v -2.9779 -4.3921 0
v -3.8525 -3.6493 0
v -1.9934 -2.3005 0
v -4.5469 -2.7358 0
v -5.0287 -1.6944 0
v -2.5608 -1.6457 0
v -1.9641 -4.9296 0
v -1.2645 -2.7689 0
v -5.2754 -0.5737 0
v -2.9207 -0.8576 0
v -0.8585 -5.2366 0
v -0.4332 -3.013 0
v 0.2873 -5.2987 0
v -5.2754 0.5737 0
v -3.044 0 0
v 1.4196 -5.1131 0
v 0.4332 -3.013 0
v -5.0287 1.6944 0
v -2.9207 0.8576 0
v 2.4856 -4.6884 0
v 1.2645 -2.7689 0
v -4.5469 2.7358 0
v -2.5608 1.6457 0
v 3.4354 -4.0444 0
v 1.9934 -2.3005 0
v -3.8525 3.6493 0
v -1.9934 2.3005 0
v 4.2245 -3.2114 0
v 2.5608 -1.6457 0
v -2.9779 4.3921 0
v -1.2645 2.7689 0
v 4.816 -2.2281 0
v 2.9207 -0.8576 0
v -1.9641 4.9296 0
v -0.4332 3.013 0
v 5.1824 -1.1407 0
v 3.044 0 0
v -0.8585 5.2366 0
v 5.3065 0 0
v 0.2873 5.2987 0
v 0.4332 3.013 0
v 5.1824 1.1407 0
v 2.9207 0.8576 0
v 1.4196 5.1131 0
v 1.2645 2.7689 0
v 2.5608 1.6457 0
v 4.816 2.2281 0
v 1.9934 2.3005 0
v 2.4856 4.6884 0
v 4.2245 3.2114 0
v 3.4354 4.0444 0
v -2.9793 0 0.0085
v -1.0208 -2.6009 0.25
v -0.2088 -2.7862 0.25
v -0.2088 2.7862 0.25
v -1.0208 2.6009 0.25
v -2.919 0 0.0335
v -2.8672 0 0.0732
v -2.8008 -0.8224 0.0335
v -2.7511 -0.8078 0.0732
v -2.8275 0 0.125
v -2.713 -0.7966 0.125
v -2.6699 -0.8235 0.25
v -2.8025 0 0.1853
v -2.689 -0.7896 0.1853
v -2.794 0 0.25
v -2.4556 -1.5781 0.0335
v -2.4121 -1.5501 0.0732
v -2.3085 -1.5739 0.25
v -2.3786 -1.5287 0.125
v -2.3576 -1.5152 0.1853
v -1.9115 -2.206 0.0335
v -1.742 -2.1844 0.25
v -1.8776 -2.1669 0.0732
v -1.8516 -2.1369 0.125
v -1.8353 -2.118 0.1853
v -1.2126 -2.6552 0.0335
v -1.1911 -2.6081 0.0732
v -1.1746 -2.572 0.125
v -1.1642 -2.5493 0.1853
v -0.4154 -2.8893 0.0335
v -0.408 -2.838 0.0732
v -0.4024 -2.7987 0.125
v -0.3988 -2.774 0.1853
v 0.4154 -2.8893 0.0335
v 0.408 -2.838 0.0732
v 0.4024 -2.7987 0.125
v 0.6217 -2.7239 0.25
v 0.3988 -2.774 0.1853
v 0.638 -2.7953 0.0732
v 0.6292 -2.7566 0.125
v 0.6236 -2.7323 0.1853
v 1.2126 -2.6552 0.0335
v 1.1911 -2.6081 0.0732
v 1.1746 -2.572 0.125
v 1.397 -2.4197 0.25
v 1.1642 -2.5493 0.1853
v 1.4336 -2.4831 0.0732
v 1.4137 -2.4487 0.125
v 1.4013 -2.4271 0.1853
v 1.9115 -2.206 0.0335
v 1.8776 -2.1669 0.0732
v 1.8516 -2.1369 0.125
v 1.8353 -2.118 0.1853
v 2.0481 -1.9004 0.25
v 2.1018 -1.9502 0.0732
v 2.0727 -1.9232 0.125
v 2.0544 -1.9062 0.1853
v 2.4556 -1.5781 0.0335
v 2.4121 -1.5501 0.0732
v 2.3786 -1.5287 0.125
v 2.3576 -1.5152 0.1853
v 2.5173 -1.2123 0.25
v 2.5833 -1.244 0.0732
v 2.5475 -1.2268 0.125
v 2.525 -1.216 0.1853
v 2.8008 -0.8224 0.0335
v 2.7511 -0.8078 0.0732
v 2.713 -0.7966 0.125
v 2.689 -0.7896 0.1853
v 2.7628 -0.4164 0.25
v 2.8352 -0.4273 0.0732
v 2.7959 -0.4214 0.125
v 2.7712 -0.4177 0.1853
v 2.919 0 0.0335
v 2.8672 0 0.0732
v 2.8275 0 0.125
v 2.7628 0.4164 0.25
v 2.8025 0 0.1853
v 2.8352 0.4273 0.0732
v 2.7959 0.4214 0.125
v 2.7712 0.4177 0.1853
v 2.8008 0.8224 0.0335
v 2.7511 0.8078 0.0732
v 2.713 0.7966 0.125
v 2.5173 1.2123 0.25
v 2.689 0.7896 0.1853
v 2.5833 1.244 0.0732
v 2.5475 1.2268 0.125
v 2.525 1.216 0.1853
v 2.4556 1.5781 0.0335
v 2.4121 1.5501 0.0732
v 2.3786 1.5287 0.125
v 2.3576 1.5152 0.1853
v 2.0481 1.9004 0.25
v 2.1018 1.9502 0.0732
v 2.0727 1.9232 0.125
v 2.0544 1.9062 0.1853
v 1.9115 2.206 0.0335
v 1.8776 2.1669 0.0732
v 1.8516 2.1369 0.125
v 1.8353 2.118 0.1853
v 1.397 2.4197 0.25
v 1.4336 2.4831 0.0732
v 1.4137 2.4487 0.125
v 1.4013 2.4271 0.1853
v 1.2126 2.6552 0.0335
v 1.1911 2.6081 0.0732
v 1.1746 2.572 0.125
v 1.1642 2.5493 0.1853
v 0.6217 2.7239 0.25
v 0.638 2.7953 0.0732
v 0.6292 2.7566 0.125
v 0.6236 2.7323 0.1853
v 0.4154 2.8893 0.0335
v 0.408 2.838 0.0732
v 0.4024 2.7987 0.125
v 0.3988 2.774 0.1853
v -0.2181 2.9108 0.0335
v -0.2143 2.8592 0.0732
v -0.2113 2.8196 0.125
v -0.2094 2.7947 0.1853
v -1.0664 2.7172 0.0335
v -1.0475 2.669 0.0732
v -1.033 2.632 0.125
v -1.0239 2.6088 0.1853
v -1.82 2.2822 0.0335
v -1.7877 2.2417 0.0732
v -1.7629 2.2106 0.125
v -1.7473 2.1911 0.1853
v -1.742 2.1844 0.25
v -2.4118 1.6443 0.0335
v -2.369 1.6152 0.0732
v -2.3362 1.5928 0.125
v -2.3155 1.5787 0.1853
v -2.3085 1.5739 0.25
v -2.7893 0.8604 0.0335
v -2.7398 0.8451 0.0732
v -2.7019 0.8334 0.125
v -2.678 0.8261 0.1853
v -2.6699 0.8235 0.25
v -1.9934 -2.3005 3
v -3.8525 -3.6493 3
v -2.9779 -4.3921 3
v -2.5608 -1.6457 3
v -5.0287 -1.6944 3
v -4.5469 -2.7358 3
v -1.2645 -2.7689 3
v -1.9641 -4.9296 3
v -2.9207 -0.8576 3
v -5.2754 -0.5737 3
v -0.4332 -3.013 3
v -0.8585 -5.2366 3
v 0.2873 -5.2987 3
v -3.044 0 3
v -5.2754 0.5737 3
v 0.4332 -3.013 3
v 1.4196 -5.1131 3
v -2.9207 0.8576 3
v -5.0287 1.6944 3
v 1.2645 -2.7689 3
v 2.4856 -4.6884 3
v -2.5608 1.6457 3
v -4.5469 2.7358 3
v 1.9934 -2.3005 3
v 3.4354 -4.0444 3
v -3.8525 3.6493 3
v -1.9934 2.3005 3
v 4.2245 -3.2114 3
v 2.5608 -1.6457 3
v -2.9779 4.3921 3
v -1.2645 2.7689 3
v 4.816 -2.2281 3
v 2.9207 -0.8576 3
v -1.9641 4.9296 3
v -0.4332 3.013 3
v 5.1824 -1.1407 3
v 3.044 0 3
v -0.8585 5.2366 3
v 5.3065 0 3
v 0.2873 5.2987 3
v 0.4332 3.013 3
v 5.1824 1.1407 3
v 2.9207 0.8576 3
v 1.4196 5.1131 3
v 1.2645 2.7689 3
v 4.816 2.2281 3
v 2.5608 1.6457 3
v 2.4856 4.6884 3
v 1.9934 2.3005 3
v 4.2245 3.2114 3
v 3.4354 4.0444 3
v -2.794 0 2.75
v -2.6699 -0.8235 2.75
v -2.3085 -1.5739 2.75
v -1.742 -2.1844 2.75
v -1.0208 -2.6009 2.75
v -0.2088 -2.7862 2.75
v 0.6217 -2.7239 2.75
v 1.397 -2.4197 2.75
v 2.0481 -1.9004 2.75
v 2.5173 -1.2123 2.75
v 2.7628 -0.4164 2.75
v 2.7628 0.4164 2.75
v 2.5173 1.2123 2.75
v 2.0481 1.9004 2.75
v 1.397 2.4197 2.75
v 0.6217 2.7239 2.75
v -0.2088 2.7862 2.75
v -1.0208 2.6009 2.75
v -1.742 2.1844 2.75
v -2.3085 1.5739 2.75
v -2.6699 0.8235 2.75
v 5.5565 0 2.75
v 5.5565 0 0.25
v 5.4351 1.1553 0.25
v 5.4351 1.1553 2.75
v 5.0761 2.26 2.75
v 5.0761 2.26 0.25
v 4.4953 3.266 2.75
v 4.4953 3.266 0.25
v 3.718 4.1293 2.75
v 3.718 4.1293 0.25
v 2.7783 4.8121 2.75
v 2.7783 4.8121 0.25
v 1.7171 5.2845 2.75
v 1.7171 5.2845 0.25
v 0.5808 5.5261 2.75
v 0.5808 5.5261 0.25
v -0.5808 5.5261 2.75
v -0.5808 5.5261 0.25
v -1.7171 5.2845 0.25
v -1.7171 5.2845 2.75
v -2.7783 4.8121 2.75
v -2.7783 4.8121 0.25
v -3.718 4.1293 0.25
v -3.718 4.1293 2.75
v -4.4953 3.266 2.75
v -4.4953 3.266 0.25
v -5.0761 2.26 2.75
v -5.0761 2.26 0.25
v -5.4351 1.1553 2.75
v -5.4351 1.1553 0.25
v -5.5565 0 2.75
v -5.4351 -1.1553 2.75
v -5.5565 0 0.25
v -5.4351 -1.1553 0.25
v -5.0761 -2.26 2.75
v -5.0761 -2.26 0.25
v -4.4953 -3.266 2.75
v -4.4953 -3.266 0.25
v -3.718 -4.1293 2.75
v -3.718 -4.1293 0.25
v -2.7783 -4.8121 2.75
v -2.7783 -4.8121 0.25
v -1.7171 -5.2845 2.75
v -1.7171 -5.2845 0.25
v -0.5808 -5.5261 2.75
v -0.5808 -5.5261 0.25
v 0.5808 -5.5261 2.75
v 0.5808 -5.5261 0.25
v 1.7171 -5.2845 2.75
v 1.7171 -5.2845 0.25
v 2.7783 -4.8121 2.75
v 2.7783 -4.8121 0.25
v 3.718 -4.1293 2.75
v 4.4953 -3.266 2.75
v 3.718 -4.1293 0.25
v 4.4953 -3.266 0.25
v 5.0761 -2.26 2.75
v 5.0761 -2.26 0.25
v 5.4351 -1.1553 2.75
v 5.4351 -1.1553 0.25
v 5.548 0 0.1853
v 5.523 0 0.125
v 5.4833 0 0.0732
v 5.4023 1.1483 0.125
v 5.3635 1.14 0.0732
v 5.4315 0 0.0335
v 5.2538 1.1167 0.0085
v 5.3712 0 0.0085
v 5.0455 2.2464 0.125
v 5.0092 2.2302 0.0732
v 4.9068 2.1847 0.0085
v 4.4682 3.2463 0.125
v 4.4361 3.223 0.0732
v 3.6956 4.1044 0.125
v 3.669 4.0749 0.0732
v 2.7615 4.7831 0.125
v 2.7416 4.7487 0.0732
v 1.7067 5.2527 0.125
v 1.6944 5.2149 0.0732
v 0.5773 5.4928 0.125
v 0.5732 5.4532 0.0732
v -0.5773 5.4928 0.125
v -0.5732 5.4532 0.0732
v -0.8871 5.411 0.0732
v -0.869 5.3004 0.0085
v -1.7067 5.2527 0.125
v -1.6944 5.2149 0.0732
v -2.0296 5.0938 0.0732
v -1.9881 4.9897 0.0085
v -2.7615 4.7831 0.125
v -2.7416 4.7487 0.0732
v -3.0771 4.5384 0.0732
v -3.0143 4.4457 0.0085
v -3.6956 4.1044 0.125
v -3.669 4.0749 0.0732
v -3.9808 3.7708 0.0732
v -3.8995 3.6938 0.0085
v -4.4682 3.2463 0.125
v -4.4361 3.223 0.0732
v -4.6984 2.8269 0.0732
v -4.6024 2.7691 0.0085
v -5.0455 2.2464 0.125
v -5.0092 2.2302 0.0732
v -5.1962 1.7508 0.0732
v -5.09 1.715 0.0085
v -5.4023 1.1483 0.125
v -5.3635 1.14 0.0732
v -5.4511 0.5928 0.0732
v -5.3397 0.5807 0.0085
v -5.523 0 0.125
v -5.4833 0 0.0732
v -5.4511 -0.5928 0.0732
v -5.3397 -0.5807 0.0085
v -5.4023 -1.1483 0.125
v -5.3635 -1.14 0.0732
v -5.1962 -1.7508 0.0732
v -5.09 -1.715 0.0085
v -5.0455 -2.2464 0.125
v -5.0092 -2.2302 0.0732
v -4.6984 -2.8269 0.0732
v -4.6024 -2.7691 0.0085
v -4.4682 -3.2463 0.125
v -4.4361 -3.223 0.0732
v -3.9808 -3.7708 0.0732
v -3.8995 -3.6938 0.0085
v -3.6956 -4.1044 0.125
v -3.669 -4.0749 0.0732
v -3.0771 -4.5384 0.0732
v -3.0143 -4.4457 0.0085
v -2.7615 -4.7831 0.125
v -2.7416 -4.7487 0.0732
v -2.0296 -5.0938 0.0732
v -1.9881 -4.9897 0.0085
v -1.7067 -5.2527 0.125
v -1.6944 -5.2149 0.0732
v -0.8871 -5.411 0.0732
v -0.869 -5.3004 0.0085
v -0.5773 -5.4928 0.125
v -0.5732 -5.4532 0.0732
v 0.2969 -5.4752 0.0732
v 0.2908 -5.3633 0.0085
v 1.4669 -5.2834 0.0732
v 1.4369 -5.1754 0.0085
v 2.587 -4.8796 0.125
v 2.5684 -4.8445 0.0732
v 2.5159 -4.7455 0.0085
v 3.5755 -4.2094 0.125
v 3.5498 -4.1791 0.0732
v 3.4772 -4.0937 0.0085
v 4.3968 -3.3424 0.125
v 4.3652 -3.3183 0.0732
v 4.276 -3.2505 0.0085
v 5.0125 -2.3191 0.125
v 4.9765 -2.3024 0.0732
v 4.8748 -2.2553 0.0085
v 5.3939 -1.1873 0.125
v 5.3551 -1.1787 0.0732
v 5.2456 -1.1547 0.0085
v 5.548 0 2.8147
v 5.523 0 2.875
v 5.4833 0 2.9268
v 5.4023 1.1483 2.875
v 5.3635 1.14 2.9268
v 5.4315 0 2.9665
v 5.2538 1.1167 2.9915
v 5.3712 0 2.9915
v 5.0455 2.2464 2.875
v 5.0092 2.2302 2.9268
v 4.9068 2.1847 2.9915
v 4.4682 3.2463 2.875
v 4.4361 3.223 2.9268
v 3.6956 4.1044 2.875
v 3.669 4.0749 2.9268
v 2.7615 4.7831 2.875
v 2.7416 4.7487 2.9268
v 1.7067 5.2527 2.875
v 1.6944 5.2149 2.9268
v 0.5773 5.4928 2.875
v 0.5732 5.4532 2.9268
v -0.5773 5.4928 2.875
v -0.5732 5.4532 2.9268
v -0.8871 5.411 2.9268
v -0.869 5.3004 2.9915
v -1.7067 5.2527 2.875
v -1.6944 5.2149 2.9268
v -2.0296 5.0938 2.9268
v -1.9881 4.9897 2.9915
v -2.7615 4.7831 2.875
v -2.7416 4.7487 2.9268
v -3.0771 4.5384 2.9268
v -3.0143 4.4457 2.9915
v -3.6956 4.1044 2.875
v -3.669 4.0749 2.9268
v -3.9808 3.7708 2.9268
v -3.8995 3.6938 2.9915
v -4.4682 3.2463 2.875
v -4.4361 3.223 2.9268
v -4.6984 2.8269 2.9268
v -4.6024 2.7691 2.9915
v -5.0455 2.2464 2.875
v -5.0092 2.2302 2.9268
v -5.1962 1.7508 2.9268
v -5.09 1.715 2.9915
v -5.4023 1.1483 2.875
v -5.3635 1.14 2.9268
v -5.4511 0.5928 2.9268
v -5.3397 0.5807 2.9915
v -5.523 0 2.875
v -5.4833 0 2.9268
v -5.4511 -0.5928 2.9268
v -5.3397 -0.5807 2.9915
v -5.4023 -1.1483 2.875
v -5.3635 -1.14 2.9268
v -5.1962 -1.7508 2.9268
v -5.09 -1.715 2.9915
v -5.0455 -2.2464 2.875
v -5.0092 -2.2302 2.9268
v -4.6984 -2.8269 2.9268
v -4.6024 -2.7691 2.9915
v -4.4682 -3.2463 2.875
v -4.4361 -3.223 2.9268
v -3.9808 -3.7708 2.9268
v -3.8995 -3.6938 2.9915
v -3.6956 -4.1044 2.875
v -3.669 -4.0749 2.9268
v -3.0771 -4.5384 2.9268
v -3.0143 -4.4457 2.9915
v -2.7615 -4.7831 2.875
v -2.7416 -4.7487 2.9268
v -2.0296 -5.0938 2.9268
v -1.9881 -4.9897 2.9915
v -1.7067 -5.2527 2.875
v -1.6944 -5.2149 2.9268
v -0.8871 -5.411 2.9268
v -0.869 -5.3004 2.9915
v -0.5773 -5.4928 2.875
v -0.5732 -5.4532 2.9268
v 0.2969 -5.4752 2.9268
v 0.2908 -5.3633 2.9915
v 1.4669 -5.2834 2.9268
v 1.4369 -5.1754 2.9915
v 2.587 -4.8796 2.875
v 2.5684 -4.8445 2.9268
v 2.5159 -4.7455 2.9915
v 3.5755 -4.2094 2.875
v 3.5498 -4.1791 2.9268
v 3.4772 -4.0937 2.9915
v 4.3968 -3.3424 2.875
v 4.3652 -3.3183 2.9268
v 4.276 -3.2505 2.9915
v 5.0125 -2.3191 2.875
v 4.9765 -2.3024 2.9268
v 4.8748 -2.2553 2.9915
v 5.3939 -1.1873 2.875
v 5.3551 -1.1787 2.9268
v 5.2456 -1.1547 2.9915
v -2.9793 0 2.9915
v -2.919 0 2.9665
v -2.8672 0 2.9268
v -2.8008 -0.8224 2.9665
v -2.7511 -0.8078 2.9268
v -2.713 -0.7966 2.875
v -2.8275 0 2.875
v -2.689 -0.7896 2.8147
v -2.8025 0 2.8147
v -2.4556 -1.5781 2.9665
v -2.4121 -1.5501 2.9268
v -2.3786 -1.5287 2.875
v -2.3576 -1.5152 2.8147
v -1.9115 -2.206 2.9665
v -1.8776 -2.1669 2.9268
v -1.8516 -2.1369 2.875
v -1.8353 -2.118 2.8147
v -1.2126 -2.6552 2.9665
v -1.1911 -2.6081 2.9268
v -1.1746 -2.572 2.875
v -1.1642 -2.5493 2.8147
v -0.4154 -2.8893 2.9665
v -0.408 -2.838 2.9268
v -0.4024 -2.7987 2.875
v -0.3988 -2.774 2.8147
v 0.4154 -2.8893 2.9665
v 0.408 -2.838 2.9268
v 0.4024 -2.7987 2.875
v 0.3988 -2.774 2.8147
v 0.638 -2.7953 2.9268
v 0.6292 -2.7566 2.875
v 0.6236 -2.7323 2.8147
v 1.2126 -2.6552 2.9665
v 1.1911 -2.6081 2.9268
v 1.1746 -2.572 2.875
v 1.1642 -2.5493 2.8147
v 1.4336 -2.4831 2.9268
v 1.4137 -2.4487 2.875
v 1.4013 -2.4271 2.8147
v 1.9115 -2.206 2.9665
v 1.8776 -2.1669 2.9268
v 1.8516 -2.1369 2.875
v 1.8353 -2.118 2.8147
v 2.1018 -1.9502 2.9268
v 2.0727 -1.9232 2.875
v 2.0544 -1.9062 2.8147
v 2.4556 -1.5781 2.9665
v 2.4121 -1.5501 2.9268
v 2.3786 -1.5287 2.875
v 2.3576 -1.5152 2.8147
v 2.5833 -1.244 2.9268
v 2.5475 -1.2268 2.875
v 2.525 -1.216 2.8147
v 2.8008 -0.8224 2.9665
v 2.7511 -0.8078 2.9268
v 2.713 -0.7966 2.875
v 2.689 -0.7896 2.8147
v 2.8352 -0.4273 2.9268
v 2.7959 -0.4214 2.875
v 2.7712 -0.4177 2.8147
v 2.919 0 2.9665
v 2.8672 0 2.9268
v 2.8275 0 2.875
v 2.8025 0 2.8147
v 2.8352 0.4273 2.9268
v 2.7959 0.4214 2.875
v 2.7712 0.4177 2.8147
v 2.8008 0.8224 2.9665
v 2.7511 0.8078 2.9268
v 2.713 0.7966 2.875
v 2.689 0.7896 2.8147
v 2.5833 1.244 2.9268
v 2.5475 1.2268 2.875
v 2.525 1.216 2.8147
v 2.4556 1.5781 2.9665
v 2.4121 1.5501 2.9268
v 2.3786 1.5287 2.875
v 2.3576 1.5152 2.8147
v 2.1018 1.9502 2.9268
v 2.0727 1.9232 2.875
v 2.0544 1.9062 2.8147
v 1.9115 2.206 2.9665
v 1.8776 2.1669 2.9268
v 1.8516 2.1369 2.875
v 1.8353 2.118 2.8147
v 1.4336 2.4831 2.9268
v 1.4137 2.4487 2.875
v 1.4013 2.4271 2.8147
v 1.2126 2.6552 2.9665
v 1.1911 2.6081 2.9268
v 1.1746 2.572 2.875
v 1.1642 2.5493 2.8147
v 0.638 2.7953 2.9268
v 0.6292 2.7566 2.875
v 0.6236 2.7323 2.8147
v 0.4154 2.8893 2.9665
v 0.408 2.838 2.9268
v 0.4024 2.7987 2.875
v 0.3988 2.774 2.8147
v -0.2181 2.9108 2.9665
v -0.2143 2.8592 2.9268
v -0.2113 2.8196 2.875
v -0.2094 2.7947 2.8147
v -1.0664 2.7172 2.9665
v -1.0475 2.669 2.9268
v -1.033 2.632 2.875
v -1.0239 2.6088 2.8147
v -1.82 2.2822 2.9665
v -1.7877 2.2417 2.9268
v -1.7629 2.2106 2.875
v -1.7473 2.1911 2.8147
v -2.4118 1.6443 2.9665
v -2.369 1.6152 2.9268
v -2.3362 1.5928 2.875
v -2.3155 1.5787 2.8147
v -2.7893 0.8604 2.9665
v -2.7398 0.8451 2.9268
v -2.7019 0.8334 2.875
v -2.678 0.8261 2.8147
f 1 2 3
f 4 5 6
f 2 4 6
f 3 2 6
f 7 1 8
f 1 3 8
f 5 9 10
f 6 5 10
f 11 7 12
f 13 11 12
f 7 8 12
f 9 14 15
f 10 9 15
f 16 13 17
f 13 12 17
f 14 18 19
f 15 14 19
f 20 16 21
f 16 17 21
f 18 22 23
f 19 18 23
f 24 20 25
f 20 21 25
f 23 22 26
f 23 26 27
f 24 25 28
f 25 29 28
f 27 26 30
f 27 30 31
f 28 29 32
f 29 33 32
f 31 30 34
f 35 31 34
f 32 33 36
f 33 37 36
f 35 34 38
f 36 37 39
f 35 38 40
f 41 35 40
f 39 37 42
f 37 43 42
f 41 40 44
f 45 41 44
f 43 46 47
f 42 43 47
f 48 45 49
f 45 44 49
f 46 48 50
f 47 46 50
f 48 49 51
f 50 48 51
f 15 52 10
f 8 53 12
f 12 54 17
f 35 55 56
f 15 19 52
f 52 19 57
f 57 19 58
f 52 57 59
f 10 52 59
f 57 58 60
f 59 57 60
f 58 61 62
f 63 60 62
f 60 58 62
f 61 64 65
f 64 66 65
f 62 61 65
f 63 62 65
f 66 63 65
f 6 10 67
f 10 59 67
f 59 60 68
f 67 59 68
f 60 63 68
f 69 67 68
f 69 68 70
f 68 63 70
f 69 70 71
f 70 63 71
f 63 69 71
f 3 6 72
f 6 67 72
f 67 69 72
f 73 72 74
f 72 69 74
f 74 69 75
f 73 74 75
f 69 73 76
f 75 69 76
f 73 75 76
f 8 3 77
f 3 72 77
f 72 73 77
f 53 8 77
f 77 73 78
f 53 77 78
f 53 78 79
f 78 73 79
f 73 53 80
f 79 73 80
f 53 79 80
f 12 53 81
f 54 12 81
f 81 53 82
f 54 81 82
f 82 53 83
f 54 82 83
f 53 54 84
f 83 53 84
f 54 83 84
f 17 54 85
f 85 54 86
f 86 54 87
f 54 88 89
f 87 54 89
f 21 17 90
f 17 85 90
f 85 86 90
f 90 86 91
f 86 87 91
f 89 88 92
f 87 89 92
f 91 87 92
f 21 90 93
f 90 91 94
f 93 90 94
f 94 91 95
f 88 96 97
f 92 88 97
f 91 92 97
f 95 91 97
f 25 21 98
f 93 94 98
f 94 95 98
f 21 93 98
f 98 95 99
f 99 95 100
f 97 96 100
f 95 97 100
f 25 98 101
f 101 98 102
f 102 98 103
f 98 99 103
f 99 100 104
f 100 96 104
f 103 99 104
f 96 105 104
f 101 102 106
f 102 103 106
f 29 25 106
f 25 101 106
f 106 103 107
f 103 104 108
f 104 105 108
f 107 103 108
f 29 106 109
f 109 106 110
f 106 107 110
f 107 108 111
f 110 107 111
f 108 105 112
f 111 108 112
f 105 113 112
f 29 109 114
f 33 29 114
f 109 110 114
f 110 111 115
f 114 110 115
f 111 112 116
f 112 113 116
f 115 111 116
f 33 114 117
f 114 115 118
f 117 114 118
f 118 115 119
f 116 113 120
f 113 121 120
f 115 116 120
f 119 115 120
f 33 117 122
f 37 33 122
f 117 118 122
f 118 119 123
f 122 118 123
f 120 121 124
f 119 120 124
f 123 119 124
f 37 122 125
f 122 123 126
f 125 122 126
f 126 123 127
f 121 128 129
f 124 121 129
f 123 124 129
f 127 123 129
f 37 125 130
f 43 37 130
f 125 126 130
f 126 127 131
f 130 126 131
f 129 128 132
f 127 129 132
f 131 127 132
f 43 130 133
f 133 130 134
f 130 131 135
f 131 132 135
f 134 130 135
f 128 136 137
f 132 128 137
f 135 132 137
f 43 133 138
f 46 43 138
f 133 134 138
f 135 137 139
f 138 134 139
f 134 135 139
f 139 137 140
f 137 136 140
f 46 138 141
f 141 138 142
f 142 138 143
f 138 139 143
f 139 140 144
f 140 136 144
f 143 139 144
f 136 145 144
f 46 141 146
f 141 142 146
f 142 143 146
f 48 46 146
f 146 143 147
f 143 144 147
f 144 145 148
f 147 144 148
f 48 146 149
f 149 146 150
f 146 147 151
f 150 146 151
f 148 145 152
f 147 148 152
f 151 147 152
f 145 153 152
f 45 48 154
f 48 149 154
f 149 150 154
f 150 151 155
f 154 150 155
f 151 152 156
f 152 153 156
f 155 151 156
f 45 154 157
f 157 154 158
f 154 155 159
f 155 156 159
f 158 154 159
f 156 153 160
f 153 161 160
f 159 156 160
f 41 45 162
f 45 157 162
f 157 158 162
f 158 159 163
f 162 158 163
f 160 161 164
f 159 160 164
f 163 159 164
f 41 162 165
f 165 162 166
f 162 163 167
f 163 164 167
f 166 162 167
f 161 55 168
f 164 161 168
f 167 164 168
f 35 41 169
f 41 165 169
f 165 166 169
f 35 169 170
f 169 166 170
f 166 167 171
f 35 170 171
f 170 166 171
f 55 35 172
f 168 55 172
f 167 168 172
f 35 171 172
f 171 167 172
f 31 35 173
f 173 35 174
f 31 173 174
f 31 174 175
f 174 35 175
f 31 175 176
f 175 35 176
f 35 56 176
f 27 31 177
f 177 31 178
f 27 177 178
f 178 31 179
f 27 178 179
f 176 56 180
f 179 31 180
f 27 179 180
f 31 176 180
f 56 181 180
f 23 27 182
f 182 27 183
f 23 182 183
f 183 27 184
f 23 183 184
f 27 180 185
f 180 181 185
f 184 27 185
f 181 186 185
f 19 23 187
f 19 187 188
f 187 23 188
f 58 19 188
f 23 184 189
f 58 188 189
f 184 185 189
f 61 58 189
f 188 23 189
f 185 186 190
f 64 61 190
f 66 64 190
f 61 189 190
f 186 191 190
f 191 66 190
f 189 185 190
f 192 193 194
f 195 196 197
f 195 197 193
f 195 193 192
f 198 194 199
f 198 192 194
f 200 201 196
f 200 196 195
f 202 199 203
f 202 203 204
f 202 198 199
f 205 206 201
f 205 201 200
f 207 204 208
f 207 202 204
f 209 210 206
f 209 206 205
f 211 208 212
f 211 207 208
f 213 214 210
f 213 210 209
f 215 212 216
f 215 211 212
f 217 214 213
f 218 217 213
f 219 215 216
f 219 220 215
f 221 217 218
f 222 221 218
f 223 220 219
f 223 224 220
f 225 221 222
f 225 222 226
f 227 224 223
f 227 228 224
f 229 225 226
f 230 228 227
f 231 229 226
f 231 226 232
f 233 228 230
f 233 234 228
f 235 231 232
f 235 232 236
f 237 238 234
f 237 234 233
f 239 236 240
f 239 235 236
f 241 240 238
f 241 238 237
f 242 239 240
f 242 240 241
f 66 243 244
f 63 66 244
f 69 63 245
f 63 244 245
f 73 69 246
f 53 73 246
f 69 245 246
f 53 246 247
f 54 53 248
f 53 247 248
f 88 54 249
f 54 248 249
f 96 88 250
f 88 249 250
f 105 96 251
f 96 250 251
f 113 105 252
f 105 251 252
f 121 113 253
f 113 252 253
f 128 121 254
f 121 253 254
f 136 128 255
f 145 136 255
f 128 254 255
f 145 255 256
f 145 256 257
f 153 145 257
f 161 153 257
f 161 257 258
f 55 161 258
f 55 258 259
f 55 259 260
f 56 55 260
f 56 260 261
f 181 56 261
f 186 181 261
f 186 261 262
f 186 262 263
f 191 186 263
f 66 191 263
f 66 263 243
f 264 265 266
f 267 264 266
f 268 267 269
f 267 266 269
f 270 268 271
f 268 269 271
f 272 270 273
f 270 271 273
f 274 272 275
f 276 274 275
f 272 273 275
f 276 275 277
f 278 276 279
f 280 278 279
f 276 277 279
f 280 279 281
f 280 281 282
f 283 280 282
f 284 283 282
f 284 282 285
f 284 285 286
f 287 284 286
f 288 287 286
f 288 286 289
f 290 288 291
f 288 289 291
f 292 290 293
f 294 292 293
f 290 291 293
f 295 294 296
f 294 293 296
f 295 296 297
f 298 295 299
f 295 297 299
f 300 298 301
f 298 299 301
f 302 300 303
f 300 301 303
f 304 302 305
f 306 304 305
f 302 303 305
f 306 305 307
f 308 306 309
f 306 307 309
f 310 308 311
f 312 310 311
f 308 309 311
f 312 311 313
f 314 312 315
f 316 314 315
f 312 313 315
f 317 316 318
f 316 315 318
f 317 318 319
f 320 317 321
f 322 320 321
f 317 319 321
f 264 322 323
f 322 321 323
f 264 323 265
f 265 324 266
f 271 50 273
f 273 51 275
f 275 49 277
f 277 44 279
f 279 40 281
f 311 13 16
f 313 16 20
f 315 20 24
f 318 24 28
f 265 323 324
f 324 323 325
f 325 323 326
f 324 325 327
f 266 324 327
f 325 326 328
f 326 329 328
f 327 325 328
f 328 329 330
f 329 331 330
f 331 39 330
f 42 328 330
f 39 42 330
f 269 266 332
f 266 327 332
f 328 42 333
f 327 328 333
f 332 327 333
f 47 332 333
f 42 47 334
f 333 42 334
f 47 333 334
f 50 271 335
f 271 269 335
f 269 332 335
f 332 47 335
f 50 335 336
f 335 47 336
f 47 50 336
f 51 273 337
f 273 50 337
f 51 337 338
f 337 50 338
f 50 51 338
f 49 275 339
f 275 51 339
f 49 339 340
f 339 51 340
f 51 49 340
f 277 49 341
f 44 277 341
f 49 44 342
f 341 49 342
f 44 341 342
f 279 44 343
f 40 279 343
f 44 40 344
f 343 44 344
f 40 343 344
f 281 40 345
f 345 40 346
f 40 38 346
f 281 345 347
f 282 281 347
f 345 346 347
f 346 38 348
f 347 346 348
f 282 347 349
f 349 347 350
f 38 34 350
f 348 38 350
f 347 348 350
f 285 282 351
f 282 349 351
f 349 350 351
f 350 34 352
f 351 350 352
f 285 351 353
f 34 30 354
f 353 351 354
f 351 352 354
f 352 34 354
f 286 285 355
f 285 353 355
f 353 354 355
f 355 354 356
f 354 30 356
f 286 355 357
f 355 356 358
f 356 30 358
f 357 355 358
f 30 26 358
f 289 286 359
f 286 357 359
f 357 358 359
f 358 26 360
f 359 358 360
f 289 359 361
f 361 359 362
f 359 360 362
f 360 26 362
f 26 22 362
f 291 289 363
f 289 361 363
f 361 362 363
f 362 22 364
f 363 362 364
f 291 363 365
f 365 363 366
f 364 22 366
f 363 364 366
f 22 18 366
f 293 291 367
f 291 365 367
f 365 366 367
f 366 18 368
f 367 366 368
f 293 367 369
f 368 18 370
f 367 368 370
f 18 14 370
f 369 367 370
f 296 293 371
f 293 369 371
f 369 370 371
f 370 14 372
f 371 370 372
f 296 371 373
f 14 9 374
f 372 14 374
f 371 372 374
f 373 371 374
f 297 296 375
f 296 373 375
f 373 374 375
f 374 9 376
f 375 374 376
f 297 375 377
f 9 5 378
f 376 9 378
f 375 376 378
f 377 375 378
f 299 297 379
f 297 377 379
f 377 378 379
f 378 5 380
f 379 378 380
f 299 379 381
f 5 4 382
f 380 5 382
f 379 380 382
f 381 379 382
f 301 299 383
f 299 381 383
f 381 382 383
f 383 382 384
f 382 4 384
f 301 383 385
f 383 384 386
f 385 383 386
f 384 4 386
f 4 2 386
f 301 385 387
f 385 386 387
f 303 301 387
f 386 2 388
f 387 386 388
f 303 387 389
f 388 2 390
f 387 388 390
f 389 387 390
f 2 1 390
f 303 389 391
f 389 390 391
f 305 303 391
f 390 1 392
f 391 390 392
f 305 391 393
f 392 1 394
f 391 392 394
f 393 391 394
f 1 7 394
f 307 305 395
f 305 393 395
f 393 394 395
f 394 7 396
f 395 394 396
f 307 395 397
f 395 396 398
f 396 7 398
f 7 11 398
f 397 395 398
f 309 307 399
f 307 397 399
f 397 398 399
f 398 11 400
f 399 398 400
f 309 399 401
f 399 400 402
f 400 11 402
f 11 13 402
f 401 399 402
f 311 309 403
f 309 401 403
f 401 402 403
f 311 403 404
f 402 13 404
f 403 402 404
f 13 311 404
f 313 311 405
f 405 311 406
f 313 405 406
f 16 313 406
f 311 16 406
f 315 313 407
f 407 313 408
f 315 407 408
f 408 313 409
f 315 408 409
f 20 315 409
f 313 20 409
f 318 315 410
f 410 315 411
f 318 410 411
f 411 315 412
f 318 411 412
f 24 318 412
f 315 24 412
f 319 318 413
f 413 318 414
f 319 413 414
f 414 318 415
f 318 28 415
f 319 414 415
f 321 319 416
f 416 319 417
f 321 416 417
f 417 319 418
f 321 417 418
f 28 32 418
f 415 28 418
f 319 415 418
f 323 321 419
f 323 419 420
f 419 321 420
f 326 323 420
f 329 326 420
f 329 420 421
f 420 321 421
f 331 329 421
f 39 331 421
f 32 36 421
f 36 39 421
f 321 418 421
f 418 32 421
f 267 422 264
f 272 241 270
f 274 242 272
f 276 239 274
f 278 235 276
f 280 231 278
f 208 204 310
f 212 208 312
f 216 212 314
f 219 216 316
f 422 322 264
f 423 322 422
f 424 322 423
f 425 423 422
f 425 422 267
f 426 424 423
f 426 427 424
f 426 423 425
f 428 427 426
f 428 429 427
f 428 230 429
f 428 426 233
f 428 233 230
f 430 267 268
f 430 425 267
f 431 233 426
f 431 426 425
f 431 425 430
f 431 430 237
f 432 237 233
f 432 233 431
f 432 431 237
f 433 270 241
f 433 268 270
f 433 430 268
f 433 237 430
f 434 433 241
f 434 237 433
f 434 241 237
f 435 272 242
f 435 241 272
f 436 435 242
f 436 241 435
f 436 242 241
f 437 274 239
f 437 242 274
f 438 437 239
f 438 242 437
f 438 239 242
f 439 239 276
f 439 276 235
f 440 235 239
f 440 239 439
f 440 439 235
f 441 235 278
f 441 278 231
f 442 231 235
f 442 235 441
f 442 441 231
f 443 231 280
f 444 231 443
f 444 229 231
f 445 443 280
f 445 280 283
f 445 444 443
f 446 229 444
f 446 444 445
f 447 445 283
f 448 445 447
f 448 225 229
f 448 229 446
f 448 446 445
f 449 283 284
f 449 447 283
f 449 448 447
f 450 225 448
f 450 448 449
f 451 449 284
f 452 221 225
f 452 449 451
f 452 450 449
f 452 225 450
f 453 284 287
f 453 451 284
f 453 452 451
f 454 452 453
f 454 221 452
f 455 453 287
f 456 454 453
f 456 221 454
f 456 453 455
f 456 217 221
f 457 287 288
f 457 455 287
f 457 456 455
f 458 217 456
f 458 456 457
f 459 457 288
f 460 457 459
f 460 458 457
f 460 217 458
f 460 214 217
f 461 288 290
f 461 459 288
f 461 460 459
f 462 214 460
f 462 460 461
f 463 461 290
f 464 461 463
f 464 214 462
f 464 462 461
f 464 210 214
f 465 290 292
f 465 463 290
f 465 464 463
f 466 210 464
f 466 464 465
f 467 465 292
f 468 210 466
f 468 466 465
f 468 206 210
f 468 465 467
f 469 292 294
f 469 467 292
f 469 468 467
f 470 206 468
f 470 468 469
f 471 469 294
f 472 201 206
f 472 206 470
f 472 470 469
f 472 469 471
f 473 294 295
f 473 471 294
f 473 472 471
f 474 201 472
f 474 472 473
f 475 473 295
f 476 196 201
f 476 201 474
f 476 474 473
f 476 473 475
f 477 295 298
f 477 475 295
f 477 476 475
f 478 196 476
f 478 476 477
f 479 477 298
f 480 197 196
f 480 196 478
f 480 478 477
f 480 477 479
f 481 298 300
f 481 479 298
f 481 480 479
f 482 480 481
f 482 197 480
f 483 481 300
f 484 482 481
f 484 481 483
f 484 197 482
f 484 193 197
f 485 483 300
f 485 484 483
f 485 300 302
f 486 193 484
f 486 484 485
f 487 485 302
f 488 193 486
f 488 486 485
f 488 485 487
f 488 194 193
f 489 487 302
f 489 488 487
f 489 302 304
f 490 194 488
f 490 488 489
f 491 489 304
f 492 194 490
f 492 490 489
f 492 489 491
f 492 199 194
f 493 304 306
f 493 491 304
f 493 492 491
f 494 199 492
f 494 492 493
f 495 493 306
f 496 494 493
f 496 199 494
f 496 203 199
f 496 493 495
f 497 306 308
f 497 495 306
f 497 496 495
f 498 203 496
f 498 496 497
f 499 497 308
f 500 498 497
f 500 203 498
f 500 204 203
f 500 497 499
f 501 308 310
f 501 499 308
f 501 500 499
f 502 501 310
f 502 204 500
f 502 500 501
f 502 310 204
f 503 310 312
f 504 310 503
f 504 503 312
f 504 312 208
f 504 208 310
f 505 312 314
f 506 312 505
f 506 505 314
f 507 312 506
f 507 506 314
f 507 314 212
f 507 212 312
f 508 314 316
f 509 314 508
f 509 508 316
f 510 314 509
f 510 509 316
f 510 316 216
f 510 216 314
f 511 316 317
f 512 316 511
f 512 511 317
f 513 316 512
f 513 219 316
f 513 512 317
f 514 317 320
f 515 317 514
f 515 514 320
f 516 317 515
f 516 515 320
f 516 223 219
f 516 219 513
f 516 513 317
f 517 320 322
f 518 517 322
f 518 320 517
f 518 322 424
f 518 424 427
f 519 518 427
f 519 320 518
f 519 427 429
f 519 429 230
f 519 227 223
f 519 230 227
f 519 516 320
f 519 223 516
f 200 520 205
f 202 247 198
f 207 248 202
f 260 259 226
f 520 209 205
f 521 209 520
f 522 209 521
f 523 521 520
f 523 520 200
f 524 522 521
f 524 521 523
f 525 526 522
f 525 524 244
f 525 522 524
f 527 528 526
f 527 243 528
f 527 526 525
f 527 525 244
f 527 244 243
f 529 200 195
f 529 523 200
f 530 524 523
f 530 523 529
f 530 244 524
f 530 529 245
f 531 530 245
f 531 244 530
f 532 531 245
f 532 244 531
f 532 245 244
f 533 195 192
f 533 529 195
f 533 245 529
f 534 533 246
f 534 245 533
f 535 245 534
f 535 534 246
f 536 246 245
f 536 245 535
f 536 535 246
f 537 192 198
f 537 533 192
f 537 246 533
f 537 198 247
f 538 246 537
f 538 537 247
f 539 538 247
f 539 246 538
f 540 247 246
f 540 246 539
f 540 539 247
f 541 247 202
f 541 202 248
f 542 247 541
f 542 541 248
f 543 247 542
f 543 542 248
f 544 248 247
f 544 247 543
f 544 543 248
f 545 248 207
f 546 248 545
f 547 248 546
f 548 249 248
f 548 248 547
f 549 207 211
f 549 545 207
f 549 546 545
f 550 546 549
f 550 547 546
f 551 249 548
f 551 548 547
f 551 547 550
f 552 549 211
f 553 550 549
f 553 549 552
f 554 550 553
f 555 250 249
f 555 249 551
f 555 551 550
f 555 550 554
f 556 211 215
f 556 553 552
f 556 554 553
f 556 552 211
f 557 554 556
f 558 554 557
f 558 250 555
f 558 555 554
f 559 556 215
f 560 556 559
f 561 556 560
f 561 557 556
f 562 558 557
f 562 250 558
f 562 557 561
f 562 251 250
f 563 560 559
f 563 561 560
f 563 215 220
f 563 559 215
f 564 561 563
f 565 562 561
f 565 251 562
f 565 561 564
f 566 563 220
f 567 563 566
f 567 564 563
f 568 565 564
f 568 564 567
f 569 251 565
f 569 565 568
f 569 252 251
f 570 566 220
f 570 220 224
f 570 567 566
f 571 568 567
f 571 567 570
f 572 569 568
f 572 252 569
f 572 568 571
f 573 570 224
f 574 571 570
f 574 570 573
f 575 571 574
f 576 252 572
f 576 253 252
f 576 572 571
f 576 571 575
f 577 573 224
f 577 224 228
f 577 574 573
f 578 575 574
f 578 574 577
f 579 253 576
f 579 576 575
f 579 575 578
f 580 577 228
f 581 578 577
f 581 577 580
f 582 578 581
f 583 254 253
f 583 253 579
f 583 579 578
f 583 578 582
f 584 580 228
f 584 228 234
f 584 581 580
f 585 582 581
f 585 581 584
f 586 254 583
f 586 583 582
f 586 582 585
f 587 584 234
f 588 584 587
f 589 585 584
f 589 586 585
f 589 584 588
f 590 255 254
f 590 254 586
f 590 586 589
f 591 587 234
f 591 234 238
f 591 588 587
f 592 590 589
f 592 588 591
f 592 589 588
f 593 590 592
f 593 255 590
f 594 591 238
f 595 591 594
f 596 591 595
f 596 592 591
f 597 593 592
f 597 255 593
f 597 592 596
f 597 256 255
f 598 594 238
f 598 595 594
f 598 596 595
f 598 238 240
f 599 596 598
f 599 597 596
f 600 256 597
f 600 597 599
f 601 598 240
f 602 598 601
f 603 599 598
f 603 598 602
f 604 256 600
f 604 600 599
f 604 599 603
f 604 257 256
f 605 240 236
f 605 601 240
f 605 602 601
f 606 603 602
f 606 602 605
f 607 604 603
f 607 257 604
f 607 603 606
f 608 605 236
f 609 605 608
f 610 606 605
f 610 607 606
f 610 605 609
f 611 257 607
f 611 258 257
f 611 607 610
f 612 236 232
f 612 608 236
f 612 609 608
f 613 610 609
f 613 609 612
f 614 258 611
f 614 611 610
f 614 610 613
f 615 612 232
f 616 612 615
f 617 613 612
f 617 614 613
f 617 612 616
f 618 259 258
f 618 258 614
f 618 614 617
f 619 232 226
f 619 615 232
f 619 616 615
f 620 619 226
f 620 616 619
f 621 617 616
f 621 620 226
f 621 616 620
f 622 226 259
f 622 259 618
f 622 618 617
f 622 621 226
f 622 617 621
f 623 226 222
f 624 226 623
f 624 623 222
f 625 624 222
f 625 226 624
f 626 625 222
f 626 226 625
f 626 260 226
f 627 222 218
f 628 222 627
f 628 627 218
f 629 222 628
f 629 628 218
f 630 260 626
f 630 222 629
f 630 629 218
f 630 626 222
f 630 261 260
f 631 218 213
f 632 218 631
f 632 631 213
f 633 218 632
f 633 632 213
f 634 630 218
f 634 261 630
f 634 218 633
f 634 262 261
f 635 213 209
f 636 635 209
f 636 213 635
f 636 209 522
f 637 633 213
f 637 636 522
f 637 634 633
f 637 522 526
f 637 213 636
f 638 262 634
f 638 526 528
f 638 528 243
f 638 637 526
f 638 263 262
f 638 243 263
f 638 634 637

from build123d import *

# Parameters (mm, degrees)
F0_R     = 5.5565
F1_DEPTH = 3
F2_D     = 5.588
F3_R     = 0.25


with BuildPart() as f1:
    # F0 (on Top) → F1 (new body)
    with BuildSketch(Plane.XY):
        Circle(F0_R)
    extrude(amount=F1_DEPTH)

    # F2 (through all)
    with Locations(Plane(origin=(0, 0, 0), x_dir=(1, 0, 0), z_dir=(0, 0, -1))):
        with Locations((0, 0)):
            Hole(F2_D / 2)

    # F3
    f3_edges = [f1.edges().sort_by_distance(p)[0] for p in [
        (-5.5565, 0, 0),
        (-5.5565, 0, 3),
        (-2.794, 0, 3),
        (-2.794, 0, 0),
    ]]
    fillet(f3_edges, radius=F3_R)


solid = f1.part
